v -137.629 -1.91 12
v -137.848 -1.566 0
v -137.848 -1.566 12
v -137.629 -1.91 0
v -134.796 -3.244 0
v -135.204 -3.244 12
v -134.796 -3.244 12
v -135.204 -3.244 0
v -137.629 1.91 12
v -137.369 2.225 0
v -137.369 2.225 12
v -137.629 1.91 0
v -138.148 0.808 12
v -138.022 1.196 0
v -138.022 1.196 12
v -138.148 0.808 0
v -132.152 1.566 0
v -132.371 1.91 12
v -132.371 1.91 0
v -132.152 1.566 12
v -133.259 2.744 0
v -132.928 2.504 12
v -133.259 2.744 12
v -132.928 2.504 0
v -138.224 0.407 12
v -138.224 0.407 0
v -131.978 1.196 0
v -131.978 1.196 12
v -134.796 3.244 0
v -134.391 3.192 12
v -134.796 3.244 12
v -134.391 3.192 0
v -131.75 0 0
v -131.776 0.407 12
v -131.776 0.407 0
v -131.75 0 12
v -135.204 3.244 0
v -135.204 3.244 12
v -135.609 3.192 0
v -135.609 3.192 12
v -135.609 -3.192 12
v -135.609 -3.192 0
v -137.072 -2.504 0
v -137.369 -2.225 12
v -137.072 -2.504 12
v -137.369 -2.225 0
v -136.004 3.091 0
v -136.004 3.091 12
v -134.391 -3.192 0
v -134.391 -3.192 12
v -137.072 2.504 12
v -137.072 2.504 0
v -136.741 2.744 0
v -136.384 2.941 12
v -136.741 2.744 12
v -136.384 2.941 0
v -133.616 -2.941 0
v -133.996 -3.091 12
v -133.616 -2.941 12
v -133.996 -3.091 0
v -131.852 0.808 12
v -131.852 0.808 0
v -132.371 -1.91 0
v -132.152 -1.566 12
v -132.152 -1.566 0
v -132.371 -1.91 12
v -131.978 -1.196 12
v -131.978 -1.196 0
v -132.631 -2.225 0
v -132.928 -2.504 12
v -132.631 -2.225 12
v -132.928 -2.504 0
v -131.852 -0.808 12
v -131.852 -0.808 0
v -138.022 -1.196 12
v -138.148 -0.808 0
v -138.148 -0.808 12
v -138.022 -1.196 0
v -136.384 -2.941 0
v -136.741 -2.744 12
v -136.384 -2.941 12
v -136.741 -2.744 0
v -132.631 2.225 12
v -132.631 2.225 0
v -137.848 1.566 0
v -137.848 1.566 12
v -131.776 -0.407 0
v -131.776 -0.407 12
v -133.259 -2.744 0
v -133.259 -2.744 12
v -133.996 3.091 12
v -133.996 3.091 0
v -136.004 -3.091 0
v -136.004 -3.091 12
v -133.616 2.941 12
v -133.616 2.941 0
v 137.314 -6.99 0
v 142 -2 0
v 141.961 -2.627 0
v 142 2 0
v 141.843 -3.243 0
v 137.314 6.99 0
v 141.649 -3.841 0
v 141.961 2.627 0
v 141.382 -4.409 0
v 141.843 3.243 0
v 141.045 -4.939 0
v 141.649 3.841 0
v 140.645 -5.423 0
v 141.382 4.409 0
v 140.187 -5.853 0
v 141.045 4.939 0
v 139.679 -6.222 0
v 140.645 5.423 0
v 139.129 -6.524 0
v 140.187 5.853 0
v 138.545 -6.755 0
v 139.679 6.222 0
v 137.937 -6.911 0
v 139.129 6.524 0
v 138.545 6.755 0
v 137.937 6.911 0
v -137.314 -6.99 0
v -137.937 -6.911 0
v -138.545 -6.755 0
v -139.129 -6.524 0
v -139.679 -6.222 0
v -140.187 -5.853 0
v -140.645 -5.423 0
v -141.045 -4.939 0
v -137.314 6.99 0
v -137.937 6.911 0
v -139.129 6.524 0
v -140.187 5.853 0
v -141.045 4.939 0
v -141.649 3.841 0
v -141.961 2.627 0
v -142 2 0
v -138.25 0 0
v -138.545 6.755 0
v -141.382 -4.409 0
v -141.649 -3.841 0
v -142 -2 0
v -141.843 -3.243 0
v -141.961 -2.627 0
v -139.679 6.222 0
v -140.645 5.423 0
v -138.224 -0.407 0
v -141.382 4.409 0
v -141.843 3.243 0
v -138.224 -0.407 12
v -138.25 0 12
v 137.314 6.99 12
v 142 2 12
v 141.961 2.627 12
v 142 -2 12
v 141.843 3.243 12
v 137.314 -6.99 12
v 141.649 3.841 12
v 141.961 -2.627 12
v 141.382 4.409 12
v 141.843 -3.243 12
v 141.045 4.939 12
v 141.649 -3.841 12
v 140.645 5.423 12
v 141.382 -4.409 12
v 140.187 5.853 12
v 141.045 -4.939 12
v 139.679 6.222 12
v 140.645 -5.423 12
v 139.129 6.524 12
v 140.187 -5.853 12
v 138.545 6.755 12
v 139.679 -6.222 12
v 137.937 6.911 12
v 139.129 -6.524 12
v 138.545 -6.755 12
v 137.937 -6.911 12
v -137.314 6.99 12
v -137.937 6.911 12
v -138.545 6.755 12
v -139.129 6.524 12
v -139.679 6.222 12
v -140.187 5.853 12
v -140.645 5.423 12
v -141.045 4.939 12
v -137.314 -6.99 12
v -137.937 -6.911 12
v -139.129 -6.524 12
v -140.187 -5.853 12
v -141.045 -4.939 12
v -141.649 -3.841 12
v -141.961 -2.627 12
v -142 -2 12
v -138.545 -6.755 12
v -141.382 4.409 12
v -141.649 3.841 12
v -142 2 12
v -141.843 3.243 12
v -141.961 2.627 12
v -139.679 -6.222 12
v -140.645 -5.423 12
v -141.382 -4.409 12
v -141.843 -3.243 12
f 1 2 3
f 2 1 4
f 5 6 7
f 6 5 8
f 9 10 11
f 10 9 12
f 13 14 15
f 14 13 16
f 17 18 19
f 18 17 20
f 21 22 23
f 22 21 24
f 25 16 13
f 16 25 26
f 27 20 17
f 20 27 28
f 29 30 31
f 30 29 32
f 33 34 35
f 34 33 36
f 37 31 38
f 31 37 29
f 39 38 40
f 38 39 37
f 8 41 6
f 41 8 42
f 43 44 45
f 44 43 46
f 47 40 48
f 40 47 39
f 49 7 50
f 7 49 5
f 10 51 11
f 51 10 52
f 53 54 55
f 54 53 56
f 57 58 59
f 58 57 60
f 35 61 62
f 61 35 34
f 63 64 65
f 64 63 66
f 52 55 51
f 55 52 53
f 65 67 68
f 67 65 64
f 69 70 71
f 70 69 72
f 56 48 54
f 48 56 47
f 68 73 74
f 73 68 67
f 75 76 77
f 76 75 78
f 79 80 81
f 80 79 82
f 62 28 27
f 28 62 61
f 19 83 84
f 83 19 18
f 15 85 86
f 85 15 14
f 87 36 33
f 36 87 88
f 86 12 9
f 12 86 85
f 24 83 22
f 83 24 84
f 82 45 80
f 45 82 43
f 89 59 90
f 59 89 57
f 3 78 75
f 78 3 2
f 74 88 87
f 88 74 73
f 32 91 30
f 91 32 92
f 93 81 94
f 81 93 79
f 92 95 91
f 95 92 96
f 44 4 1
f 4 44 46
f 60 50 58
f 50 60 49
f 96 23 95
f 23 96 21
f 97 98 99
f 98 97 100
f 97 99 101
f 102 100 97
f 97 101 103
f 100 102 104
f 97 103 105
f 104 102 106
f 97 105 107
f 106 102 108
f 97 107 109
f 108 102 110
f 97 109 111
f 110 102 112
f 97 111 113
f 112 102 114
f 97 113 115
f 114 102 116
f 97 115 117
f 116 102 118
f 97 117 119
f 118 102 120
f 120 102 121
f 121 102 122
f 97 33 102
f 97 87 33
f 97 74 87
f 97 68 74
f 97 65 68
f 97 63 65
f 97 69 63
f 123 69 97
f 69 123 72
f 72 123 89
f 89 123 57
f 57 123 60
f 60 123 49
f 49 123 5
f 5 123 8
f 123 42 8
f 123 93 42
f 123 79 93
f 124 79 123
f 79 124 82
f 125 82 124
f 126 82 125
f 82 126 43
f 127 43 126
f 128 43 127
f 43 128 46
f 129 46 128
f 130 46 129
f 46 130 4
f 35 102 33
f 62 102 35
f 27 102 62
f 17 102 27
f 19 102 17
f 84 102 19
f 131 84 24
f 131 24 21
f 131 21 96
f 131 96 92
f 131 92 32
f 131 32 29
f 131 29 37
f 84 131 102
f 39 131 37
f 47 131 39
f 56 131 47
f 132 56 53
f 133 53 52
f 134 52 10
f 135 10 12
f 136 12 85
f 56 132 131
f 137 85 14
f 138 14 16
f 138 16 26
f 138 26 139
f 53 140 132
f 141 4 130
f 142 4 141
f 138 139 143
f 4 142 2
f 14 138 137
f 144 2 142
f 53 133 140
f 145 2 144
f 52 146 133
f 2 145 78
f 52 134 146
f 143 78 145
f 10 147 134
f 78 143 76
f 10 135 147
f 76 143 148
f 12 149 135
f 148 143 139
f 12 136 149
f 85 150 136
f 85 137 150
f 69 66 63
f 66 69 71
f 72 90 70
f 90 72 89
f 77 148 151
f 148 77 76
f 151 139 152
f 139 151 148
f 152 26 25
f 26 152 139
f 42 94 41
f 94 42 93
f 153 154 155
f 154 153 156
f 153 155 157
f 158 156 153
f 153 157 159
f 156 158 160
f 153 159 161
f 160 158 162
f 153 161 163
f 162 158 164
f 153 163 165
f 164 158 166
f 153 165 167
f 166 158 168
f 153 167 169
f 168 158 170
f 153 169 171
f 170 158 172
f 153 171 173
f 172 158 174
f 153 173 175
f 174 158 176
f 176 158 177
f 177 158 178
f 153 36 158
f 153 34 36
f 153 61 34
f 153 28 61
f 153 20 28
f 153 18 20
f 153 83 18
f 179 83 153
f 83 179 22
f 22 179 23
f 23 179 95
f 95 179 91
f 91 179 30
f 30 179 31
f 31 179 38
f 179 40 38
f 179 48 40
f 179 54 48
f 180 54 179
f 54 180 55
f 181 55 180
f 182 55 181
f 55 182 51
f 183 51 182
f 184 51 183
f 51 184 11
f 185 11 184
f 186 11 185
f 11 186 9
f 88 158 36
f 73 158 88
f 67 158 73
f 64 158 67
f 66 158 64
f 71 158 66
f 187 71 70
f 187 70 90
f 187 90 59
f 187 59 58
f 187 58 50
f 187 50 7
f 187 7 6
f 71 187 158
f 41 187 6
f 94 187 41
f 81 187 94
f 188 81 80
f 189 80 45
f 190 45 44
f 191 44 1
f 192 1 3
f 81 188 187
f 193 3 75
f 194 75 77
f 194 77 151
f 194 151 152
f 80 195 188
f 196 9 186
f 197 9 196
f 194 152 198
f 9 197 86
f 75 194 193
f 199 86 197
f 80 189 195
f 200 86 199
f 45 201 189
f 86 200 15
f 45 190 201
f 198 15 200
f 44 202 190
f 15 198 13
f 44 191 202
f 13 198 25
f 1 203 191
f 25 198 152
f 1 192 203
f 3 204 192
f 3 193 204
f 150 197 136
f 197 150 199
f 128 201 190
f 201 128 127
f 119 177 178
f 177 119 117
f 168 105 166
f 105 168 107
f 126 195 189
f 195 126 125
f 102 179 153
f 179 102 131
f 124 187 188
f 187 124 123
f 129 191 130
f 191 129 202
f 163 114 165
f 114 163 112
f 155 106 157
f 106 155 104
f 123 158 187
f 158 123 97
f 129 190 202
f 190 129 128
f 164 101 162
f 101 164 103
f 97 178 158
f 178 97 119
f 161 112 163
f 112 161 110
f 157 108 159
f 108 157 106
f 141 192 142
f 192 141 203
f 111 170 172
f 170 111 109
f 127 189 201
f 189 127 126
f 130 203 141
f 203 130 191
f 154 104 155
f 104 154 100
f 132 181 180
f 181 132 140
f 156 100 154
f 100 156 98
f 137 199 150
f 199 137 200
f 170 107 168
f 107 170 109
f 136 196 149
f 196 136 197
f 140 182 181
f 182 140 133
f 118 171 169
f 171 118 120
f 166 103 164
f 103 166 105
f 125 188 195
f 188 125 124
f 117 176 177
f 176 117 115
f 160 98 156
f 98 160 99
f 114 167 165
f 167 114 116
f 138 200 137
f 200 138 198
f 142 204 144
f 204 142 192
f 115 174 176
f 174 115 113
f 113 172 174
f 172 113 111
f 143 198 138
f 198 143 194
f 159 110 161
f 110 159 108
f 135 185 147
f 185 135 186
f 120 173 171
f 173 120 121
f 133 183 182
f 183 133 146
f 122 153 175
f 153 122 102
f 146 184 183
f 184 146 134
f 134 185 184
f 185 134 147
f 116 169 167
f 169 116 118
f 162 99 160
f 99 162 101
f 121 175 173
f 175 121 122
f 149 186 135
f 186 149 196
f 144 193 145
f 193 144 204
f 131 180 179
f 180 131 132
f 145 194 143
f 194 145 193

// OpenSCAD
$fn = 50;


difference() {
	union() {
		hull() {
			translate(v = [-137.0000000000, 2.0000000000, 0]) {
				cylinder(h = 12, r = 5);
			}
			translate(v = [137.0000000000, 2.0000000000, 0]) {
				cylinder(h = 12, r = 5);
			}
			translate(v = [-137.0000000000, -2.0000000000, 0]) {
				cylinder(h = 12, r = 5);
			}
			translate(v = [137.0000000000, -2.0000000000, 0]) {
				cylinder(h = 12, r = 5);
			}
		}
	}
	union() {
		translate(v = [-135.0000000000, 0.0000000000, 0]) {
			cylinder(h = 12, r = 3.2500000000);
		}
		translate(v = [-135.0000000000, 0.0000000000, 0]) {
			cylinder(h = 12, r = 1.8000000000);
		}
		translate(v = [-135.0000000000, 0.0000000000, 0]) {
			cylinder(h = 12, r = 1.8000000000);
		}
		translate(v = [-135.0000000000, 0.0000000000, 0]) {
			cylinder(h = 12, r = 1.8000000000);
		}
	}
}
